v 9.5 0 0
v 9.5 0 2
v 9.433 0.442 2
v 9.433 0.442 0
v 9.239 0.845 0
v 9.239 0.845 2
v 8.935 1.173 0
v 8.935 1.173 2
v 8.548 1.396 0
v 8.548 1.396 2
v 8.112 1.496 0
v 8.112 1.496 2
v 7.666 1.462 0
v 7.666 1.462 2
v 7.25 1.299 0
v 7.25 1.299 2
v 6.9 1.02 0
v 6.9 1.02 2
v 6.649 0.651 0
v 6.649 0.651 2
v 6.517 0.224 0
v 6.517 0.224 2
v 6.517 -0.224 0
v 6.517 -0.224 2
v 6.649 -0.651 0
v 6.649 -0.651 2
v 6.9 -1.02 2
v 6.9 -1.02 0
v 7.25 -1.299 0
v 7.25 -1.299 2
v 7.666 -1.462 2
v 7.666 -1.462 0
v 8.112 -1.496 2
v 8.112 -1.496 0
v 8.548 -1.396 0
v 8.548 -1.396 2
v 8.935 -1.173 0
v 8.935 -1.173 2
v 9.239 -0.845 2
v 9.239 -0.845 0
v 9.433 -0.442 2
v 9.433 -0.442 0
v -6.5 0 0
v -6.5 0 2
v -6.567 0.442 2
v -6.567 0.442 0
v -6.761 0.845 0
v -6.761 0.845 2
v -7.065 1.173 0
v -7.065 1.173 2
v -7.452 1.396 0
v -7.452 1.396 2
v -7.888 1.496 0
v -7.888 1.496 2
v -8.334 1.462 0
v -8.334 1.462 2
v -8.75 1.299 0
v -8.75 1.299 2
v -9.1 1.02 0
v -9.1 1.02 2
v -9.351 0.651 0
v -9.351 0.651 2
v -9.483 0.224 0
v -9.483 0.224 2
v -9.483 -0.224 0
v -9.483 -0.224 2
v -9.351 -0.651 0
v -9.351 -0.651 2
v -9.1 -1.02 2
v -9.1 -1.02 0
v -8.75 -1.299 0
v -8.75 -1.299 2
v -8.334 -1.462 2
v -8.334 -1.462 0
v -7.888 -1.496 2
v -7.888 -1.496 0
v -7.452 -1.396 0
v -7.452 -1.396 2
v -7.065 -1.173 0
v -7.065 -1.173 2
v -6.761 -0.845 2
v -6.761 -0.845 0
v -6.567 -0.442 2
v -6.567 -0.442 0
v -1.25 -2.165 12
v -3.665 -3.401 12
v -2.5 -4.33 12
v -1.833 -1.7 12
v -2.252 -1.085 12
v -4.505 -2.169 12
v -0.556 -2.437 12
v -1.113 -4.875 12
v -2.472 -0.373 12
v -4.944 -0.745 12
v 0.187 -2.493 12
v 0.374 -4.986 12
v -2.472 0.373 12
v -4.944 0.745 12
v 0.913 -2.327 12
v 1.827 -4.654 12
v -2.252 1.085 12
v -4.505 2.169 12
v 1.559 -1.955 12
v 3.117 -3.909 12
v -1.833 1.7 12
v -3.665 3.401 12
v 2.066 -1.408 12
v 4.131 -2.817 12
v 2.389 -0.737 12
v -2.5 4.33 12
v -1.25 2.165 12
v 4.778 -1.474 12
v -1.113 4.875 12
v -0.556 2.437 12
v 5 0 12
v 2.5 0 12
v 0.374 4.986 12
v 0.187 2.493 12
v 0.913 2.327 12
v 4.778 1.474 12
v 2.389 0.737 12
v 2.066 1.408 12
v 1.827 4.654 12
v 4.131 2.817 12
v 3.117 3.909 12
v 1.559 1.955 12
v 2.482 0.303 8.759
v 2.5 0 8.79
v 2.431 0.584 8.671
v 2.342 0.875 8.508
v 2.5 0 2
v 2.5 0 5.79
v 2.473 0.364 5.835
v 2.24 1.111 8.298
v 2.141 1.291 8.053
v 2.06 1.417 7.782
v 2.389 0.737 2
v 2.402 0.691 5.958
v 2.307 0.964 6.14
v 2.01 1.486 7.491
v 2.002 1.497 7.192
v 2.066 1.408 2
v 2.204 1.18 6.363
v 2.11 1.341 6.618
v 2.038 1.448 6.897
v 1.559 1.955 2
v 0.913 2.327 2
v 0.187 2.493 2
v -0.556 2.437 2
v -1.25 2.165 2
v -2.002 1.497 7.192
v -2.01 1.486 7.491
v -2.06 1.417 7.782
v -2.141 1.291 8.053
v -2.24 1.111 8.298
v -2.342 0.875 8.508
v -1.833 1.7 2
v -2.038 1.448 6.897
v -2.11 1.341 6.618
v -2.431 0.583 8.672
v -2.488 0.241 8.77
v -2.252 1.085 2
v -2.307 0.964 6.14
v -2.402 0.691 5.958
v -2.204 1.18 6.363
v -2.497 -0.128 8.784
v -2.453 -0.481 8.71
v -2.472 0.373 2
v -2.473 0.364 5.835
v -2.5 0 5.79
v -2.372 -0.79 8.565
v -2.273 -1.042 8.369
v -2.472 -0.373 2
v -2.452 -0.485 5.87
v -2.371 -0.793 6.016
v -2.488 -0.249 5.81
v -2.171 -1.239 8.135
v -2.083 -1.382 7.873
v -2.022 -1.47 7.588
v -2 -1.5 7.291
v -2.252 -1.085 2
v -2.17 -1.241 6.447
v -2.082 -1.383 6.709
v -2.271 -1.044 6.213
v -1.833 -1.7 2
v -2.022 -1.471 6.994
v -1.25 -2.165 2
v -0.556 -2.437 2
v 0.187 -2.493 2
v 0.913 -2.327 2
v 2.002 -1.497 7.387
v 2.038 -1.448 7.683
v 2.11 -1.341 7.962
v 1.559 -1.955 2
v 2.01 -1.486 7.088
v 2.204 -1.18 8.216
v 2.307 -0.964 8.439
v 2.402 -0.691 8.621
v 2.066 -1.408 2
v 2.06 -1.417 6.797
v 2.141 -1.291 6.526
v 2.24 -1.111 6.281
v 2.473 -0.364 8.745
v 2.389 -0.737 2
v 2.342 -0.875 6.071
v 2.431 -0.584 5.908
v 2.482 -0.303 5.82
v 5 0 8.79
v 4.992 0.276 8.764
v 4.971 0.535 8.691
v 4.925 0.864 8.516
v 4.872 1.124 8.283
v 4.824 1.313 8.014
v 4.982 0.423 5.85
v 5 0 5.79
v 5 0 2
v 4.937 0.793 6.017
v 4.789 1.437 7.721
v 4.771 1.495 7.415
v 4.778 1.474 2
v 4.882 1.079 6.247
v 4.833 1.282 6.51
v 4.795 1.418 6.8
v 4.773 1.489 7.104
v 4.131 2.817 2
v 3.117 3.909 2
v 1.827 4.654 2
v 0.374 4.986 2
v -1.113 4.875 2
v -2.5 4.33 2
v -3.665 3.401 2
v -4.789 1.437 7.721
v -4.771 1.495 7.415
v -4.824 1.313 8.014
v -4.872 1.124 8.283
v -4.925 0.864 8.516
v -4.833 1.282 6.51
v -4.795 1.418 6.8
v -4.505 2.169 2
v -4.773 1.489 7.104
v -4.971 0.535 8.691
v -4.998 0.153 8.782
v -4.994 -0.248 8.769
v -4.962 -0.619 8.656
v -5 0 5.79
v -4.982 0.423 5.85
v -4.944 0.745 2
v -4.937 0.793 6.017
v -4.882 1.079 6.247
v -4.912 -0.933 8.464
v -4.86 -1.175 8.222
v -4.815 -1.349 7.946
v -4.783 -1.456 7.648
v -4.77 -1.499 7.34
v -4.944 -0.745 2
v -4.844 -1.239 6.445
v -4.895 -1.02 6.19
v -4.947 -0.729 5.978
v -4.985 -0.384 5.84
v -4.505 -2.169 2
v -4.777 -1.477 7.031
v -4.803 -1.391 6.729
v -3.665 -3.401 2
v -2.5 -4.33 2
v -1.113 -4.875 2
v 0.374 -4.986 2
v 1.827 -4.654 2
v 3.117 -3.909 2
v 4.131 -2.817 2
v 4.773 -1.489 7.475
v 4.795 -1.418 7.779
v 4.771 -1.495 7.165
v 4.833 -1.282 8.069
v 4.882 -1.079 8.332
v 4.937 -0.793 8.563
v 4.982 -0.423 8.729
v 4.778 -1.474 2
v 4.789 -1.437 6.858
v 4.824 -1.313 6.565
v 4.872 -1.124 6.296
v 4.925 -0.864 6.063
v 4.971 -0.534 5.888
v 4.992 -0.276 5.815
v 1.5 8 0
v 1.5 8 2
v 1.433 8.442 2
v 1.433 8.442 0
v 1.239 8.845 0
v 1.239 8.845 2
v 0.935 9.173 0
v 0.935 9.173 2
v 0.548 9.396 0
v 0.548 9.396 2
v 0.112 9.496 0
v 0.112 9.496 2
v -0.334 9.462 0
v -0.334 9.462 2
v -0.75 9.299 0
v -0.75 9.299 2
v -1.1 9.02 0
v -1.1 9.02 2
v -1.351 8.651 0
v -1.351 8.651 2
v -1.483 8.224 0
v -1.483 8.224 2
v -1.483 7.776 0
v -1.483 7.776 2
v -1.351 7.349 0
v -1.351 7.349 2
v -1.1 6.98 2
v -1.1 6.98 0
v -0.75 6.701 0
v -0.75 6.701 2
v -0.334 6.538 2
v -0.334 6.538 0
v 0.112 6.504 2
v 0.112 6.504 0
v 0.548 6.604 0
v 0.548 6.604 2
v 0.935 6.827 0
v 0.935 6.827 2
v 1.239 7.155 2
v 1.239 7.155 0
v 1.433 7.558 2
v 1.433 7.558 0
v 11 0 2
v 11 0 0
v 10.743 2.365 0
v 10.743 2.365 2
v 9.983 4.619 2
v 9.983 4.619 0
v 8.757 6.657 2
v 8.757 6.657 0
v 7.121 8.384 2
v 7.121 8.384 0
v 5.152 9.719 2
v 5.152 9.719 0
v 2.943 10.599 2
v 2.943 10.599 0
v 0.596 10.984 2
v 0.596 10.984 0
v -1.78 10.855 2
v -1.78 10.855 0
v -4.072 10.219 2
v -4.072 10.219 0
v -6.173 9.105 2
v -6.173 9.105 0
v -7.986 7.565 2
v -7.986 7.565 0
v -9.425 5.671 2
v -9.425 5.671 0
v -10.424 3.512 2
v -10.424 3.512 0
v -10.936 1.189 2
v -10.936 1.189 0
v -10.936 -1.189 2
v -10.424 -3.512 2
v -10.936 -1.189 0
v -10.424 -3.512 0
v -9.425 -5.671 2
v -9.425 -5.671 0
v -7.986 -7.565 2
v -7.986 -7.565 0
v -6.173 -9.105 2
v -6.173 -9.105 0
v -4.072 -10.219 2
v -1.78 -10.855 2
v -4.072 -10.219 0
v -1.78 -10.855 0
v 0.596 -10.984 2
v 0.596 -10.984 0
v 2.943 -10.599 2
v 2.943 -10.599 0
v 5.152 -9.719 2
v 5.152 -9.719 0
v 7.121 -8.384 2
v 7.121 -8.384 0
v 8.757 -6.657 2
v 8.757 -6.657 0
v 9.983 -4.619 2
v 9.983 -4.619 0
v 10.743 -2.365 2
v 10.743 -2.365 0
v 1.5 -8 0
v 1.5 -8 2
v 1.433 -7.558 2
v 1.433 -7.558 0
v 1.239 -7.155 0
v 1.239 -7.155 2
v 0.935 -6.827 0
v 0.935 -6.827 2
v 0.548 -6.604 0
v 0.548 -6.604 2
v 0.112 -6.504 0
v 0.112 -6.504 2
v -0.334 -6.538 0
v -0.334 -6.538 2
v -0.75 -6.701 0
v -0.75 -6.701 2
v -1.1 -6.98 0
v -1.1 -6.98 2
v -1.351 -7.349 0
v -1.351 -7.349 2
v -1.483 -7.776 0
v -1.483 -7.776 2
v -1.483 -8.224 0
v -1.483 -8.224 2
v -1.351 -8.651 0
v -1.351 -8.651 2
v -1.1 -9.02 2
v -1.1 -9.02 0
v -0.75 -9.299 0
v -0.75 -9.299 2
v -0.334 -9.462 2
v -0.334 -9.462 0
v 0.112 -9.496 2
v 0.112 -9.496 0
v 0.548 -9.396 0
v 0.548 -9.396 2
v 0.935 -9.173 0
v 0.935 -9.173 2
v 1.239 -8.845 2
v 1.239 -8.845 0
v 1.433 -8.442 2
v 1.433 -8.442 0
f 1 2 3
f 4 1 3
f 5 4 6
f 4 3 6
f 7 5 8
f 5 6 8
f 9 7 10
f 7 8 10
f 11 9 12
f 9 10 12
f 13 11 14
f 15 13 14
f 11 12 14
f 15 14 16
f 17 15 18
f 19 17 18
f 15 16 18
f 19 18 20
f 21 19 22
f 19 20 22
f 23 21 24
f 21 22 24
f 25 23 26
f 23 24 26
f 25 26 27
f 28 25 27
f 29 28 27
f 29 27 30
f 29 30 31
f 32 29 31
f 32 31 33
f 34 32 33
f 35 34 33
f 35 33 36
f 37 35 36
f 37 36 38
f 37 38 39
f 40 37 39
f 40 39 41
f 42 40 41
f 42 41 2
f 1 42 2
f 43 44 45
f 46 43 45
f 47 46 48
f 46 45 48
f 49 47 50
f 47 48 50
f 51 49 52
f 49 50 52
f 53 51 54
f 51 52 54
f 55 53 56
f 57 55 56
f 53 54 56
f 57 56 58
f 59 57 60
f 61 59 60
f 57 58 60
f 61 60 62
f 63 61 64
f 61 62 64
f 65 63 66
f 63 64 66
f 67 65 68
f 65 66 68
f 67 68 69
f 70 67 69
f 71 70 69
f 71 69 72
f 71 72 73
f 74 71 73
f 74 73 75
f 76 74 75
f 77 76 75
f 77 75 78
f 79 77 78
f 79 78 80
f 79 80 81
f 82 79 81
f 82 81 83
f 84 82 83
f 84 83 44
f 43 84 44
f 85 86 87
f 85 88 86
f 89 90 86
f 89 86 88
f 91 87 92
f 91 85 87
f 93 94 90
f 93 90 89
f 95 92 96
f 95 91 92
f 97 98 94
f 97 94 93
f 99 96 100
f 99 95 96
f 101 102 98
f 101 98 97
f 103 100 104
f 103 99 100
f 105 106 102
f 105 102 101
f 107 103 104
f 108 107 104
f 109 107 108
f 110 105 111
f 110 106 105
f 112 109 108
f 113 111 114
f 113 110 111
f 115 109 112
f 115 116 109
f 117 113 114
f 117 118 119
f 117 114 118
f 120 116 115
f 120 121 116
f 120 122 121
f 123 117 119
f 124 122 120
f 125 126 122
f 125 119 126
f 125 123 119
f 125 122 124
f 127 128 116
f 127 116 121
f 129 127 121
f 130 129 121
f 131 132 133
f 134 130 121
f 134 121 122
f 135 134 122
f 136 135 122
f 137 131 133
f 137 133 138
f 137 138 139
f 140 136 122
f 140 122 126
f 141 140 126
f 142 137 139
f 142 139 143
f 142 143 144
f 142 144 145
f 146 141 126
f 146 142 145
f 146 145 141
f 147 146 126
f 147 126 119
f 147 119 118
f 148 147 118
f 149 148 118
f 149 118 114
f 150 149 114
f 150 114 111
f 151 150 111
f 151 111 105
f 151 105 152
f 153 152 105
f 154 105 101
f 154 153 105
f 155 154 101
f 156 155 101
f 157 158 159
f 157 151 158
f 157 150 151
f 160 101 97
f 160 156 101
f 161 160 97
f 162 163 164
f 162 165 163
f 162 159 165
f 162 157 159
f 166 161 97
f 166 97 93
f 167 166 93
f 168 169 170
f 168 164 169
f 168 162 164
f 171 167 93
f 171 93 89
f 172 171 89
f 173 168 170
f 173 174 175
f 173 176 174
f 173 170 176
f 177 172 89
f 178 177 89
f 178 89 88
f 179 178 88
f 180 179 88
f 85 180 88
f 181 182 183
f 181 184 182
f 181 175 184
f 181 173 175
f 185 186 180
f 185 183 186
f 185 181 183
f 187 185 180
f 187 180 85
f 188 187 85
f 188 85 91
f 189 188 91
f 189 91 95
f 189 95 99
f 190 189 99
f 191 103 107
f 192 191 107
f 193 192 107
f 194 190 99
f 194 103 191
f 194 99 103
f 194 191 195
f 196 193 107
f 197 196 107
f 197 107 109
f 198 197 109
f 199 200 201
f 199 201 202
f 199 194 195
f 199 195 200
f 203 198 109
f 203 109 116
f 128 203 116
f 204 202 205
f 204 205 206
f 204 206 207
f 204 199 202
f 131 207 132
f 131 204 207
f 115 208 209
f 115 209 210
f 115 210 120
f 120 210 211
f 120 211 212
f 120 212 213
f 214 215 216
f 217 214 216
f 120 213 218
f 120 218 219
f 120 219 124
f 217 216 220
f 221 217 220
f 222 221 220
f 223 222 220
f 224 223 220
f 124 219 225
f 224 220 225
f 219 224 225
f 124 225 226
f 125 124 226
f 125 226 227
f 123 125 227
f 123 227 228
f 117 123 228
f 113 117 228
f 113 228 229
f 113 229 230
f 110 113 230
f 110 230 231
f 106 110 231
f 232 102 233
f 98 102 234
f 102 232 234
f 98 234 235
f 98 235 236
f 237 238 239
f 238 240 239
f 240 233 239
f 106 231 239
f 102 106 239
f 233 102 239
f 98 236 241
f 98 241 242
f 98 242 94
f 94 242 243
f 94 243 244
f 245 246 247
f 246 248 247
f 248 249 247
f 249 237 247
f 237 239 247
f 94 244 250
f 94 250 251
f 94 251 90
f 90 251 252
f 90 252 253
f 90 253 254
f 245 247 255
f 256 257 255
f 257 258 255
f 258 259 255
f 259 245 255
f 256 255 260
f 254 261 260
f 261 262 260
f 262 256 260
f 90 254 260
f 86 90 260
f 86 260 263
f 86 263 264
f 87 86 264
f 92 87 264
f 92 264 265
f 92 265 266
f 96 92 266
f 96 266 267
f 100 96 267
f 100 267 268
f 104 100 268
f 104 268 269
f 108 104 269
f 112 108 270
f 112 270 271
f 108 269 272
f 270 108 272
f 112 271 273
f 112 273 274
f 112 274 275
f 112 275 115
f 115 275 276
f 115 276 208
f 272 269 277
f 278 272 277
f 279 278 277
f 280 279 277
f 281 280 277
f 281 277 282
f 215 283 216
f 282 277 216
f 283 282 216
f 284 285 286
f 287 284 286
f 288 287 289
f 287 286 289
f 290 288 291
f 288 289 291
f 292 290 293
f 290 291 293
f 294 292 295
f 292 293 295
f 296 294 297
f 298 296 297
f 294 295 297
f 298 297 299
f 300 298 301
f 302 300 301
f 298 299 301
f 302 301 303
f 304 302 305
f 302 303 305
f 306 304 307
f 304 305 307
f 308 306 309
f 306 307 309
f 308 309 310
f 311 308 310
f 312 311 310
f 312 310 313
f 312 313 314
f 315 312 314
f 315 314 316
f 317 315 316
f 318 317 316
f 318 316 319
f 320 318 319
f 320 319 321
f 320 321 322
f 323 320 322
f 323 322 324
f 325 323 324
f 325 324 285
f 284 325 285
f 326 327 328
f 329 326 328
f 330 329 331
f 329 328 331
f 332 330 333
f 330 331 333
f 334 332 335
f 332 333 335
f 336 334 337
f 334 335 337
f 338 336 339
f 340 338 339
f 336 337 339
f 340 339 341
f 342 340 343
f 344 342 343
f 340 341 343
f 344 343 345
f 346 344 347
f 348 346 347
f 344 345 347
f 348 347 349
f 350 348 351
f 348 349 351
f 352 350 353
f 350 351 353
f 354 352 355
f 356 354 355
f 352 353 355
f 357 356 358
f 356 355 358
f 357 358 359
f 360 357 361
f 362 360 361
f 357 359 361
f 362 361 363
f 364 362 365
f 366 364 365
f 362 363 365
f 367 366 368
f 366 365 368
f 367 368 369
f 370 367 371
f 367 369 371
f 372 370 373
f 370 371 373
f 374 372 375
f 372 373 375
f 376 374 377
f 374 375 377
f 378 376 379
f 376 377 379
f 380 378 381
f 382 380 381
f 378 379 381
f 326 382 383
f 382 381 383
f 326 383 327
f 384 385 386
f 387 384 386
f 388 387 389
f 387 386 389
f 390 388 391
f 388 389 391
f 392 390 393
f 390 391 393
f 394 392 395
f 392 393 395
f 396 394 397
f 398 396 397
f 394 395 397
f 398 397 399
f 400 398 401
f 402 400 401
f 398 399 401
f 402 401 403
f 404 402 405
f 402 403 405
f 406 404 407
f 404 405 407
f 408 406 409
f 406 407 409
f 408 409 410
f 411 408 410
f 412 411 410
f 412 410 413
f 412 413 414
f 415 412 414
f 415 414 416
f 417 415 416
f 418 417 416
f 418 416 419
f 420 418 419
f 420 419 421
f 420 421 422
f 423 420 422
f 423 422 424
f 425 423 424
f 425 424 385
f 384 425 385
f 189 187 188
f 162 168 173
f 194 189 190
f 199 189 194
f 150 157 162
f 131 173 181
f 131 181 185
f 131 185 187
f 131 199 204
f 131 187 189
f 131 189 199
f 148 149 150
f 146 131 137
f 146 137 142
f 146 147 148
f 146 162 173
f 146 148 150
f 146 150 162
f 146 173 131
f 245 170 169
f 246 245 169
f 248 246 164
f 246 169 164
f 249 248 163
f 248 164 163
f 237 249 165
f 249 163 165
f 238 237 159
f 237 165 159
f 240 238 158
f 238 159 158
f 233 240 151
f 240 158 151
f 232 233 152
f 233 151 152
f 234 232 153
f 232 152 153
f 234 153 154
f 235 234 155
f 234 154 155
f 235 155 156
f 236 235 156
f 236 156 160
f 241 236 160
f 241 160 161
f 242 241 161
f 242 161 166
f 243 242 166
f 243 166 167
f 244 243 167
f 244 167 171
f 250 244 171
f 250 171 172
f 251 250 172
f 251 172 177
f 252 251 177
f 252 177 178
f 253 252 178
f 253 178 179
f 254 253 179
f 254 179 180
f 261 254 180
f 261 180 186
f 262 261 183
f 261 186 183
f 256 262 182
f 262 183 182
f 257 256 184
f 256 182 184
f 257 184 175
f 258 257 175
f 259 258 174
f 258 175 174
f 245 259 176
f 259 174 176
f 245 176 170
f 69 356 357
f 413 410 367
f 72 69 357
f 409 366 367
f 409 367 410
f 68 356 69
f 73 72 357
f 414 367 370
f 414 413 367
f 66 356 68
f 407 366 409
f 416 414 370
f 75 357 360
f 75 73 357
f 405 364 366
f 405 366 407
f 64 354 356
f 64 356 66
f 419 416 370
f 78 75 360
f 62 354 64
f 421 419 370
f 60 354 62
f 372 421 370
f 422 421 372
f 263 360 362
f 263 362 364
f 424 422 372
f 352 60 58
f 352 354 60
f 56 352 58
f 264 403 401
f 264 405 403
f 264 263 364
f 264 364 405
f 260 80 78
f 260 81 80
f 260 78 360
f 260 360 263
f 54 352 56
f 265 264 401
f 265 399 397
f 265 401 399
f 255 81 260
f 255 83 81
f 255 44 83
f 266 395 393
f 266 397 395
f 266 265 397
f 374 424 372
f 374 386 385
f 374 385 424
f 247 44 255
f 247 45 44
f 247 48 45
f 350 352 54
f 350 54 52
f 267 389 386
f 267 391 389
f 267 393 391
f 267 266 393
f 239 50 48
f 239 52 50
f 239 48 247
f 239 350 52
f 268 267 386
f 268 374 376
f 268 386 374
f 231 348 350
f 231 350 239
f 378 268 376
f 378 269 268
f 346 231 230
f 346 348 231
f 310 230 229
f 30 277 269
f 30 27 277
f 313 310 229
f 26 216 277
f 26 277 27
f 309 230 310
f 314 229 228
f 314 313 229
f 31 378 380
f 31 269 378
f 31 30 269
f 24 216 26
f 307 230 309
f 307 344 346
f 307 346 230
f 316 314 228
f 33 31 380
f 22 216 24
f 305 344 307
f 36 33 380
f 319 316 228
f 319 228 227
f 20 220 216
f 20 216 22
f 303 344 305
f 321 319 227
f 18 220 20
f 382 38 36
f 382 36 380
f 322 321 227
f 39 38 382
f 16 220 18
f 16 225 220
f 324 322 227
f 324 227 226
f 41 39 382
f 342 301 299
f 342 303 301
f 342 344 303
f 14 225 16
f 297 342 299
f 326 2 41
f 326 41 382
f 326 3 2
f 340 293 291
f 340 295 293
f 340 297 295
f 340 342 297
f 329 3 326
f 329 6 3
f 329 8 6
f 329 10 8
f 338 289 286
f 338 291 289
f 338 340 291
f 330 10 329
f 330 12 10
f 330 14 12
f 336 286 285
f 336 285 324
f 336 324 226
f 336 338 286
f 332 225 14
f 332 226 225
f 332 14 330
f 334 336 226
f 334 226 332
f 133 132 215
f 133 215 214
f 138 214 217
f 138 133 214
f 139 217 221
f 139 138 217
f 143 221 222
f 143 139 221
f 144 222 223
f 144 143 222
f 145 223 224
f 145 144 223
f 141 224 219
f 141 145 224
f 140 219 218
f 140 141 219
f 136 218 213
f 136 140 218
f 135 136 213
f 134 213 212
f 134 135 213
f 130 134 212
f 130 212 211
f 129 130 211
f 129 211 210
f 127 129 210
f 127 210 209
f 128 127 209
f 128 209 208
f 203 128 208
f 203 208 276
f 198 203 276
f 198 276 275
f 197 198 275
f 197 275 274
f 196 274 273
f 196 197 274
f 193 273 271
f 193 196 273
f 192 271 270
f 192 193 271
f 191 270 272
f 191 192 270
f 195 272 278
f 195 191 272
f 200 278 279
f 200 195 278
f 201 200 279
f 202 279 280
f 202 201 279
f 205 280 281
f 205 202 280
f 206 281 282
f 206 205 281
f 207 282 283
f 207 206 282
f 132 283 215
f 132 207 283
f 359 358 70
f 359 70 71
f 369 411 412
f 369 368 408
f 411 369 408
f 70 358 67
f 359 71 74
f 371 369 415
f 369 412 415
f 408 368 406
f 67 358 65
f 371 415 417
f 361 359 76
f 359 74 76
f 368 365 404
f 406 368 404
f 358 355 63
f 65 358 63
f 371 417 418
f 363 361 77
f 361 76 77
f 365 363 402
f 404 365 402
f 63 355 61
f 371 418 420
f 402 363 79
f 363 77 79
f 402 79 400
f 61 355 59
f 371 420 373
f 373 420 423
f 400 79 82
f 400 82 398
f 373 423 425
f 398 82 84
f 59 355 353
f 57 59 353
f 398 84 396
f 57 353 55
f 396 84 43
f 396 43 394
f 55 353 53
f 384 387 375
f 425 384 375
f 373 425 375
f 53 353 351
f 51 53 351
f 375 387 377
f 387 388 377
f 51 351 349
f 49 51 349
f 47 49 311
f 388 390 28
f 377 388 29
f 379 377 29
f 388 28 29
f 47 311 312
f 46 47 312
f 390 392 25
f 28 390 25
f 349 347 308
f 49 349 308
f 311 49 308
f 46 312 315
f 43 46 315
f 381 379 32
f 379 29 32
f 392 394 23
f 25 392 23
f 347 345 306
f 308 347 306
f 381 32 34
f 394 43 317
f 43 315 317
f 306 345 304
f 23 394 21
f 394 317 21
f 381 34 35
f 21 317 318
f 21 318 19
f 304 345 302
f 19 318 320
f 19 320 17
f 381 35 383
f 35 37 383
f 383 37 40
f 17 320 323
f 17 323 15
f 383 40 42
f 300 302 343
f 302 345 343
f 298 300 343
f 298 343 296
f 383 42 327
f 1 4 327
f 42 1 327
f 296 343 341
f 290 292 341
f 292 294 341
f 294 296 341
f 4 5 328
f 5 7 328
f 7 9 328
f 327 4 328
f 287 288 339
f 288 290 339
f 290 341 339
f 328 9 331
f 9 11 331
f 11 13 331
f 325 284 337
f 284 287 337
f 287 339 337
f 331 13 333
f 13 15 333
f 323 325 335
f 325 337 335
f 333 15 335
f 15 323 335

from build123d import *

# Parameters (mm, degrees)
SKETCH_1_R               = 11
EXTRUDE_1_DEPTH          = 2
SKETCH_2_R               = 5
SKETCH_2_R_2             = 2.5
EXTRUDE_2_DEPTH          = 10
SKETCH_3_R               = 1.5
CUT_EXTRUDE_1_DEPTH      = 3
SKETCH_4_R               = 1.5
CUT_EXTRUDE_2_DEPTH      = 12
CUT_EXTRUDE_2_DEPTH_BACK = 12


with BuildPart() as part:
    # 草图1 → 凸台-拉伸1 (new body)
    with BuildSketch(Plane.XY):
        Circle(SKETCH_1_R)
    extrude(amount=EXTRUDE_1_DEPTH)

    # 草图2 → 凸台-拉伸2 (add)
    with BuildSketch(Plane.XY.offset(2)):
        Circle(SKETCH_2_R)
        Circle(SKETCH_2_R_2, mode=Mode.SUBTRACT)
    extrude(amount=EXTRUDE_2_DEPTH)

    # 草图3 → 切除-拉伸1 (cut, through all)
    with BuildSketch(Plane.XY.offset(2)):
        with Locations((0, 8)):
            Circle(SKETCH_3_R)
        with Locations((8, 0)):
            Circle(SKETCH_3_R)
        with Locations((0, -8)):
            Circle(SKETCH_3_R)
        with Locations((-8, 0)):
            Circle(SKETCH_3_R)
    extrude(amount=-CUT_EXTRUDE_1_DEPTH, mode=Mode.SUBTRACT)

    # 草图4 → 切除-拉伸2 (cut, two sides)
    with BuildSketch(Plane(origin=(0, 0, 0), x_dir=(0, 0, -1), z_dir=(1, 0, 0))) as cut_extrude_2_sk:
        with Locations((-7.289607981, 0)):
            Circle(SKETCH_4_R)
    extrude(amount=CUT_EXTRUDE_2_DEPTH, mode=Mode.SUBTRACT)
    extrude(cut_extrude_2_sk.sketch, amount=-CUT_EXTRUDE_2_DEPTH_BACK, mode=Mode.SUBTRACT)


solid = part.part
